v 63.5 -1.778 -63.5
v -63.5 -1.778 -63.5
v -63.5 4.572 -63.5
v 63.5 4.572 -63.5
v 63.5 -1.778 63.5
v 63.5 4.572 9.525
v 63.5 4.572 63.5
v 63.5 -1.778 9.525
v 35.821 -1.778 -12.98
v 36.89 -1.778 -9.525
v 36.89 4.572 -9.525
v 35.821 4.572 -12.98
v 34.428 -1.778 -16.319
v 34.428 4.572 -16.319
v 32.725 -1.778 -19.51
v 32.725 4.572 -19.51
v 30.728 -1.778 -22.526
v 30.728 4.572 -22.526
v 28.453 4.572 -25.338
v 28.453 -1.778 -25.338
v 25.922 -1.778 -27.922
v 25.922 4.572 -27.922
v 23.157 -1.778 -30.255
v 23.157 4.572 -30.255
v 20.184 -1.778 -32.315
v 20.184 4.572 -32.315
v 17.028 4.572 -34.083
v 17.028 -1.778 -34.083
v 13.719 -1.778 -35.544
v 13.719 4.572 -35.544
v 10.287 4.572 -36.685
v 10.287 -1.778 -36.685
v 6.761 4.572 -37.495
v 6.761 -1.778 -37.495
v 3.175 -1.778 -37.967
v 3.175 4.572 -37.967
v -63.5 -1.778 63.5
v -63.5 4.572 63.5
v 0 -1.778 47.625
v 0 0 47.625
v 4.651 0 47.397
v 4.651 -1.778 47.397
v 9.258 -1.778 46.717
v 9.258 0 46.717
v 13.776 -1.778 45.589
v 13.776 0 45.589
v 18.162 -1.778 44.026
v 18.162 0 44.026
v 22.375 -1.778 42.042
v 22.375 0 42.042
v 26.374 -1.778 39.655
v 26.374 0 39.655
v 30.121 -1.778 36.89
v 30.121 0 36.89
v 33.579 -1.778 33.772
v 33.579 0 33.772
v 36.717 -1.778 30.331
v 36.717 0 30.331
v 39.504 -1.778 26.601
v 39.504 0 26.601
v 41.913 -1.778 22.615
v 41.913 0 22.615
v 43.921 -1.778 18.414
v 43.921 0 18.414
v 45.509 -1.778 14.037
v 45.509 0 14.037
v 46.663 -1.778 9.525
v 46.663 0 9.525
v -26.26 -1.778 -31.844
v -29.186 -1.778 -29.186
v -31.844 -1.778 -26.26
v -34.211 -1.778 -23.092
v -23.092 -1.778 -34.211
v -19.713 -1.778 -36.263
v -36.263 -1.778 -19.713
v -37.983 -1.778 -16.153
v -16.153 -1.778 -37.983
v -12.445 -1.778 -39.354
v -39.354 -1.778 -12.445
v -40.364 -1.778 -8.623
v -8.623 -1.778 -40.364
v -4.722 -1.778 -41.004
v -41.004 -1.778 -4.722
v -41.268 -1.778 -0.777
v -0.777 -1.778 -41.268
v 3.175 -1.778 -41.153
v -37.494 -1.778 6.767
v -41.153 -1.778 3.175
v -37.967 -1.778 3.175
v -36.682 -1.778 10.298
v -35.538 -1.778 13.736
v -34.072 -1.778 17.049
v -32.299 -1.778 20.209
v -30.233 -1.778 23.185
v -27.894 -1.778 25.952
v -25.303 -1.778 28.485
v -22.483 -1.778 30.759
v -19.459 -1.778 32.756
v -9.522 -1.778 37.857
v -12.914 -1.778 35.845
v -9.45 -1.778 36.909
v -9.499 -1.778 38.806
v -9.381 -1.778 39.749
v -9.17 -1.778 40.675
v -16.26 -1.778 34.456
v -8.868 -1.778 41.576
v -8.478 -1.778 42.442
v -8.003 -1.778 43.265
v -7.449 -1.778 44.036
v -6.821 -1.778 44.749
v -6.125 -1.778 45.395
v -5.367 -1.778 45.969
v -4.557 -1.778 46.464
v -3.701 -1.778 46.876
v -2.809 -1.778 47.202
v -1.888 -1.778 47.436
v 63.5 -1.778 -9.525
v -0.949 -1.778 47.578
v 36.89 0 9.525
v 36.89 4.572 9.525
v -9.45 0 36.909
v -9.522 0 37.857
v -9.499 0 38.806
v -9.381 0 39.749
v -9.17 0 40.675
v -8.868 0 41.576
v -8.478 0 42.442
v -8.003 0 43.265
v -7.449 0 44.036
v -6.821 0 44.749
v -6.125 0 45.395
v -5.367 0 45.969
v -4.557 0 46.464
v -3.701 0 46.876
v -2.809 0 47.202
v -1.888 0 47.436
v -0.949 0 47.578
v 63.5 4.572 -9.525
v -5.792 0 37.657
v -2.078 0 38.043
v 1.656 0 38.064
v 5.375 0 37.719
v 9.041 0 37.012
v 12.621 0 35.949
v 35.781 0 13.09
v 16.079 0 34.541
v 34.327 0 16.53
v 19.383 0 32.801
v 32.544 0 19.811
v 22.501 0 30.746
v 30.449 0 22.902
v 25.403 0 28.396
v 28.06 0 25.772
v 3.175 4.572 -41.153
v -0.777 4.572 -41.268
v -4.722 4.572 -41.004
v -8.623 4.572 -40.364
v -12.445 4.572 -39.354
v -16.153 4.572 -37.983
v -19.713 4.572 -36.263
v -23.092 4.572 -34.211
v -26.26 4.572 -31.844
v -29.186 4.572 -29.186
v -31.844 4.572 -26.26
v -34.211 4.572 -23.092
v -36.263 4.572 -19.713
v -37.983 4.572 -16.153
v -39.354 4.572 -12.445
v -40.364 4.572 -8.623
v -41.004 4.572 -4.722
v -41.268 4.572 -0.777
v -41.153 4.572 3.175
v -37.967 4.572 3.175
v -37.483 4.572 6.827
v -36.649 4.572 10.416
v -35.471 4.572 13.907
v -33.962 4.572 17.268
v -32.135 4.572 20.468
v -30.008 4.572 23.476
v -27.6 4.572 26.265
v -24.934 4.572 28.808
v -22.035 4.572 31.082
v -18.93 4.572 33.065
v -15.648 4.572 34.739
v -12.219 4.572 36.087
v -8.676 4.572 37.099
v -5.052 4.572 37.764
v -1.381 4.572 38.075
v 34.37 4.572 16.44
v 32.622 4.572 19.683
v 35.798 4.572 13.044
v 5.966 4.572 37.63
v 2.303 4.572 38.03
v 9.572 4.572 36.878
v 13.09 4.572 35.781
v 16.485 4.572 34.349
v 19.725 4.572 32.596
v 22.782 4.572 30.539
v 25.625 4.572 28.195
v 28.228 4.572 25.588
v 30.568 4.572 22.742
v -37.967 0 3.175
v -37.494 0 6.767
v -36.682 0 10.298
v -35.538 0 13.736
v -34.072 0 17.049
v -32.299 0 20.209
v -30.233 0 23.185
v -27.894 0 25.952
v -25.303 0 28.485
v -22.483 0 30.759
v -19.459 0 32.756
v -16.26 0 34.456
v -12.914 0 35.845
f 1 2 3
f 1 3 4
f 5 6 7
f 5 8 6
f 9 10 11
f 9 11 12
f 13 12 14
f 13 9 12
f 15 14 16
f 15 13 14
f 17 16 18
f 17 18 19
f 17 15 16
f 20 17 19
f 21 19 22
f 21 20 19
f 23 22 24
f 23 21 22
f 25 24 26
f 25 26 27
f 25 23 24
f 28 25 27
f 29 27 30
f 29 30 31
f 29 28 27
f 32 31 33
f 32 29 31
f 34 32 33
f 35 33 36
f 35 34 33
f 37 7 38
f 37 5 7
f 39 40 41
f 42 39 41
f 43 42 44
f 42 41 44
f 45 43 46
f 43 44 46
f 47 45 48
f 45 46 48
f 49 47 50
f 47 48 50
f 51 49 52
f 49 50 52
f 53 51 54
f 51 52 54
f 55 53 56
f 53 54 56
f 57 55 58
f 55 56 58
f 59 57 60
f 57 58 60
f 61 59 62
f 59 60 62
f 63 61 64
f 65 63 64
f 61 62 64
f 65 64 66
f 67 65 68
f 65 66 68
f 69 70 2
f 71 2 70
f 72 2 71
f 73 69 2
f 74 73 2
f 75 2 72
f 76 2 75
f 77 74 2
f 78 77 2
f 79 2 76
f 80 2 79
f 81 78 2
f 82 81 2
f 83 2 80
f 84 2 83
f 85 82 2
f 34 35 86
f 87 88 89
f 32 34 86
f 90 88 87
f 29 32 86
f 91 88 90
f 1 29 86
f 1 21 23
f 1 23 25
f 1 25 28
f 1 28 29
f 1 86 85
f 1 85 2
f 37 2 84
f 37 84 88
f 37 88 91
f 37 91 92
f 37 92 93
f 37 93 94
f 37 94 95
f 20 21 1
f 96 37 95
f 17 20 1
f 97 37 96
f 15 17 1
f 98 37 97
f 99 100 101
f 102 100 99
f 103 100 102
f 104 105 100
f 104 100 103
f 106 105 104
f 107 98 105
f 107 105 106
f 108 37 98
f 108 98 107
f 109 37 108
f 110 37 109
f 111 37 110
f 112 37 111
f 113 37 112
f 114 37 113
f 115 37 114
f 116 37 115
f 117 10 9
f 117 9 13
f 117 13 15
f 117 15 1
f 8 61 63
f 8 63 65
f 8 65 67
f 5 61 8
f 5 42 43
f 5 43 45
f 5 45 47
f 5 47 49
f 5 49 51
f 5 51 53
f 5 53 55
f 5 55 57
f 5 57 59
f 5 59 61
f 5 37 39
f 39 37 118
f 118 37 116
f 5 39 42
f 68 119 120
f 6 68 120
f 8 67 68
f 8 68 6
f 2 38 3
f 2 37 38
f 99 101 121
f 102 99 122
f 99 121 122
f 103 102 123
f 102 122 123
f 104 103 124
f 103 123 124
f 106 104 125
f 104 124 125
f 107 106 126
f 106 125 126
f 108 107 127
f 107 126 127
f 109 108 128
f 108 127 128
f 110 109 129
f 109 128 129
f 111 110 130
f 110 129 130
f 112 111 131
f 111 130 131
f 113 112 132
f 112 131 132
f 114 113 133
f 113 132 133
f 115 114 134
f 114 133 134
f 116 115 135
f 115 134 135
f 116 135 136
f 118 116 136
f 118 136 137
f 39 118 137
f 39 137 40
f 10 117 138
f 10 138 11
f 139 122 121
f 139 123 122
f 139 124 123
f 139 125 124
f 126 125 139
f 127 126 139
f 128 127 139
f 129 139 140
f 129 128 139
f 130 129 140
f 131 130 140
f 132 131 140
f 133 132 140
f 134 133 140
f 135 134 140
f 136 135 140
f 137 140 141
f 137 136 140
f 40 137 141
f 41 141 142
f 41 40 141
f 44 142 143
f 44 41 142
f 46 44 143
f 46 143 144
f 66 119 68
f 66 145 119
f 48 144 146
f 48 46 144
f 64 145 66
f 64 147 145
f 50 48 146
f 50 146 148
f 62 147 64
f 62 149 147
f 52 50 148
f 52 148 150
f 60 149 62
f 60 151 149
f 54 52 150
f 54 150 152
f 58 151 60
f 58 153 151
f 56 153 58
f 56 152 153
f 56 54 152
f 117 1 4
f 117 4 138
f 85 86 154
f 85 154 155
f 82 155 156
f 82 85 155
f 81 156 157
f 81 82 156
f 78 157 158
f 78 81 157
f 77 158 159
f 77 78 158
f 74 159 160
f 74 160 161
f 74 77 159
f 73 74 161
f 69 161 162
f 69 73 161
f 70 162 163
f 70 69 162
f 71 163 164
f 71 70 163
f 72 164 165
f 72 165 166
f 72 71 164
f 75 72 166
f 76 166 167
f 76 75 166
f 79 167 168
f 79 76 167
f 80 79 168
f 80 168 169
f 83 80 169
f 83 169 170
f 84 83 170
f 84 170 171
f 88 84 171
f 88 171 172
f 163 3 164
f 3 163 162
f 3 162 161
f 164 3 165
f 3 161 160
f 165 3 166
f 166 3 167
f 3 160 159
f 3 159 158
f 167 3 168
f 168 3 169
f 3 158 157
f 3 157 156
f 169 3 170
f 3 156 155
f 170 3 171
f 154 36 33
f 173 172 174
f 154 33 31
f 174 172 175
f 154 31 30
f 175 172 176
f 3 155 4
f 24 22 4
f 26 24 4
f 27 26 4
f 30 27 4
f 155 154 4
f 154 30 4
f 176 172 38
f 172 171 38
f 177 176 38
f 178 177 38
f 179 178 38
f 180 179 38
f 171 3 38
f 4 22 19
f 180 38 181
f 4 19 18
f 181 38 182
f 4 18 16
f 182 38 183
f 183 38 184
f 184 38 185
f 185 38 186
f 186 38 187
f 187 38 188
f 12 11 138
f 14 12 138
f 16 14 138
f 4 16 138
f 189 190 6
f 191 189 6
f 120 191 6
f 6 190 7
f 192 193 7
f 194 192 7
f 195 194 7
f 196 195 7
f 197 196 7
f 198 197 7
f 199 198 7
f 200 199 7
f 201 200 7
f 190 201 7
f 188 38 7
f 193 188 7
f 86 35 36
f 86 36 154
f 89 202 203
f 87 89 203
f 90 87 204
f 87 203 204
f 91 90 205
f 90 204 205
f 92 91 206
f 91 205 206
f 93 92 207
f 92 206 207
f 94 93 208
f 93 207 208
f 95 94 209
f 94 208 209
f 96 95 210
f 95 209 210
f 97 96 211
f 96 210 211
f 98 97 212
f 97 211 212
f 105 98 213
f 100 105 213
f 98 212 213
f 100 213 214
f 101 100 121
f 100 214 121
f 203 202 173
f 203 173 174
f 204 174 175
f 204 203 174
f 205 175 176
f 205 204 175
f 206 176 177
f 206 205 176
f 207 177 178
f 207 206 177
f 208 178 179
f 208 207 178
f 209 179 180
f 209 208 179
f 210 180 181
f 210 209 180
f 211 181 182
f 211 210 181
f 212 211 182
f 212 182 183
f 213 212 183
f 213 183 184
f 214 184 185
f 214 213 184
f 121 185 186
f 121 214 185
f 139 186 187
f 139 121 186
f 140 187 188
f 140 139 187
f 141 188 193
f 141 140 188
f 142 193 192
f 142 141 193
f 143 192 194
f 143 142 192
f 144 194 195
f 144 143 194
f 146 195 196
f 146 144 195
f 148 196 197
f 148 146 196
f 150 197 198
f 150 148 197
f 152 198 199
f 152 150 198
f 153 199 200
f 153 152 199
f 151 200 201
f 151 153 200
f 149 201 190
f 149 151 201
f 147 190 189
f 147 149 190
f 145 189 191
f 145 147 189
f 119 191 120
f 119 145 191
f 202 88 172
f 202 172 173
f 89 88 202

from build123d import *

# Parameters (mm, degrees)
F1_DEPTH = 1.778
F3_DEPTH = 4.572


with BuildPart() as f1:
    # F0 (on Front) → F1 (new body)
    with BuildSketch(Plane.XZ):
        with BuildLine():
            Line((-63.5, -63.5), (63.5, -63.5))
            Line((63.5, -63.5), (63.5, -9.525))
            Line((63.5, -9.525), (45.032244, -9.525))
            Line((45.032244, -9.525), (36.890166, -9.525))
            ThreePointArc((36.890166, -9.525), (24.567214, -29.121504), (3.175, -37.967478))
            Line((3.175, -37.967478), (3.175, -41.152703))
            ThreePointArc((3.175, -41.152703), (-29.185832, -29.185832), (-41.152703, 3.175))
            Line((-41.152703, 3.175), (-37.967478, 3.175))
            ThreePointArc((-37.967478, 3.175), (-29.096619, 24.596681), (-9.450293, 36.909375))
            ThreePointArc((-9.450293, 36.909375), (-7.14375, 44.400195), (0, 47.625))
            ThreePointArc((0, 47.625), (30.120695, 36.890166), (46.66278, 9.525))
            Line((46.66278, 9.525), (63.5, 9.525))
            Line((63.5, 9.525), (63.5, 63.5))
            Line((63.5, 63.5), (-63.5, 63.5))
            Line((-63.5, 63.5), (-63.5, -63.5))
        make_face()
    extrude(amount=F1_DEPTH)

    # F2 (on Front) → F3 (join)
    with BuildSketch(Plane.XZ):
        with BuildLine():
            Line((-63.5, 63.5), (-63.5, -63.5))
            Line((-63.5, -63.5), (63.5, -63.5))
            Line((63.5, -63.5), (63.5, -9.525))
            Line((63.5, -9.525), (36.890166, -9.525))
            ThreePointArc((36.890166, -9.525), (24.567214, -29.121504), (3.175, -37.967478))
            Line((3.175, -37.967478), (3.175, -41.152703))
            ThreePointArc((3.175, -41.152703), (-29.185832, -29.185832), (-41.152703, 3.175))
            Line((-41.152703, 3.175), (-37.967478, 3.175))
            ThreePointArc((-37.967478, 3.175), (-3.220369, 37.963657), (36.890166, 9.525))
            Line((36.890166, 9.525), (63.5, 9.525))
            Line((63.5, 9.525), (63.5, 63.5))
            Line((63.5, 63.5), (-63.5, 63.5))
        make_face()
    extrude(amount=-F3_DEPTH)


solid = f1.part
